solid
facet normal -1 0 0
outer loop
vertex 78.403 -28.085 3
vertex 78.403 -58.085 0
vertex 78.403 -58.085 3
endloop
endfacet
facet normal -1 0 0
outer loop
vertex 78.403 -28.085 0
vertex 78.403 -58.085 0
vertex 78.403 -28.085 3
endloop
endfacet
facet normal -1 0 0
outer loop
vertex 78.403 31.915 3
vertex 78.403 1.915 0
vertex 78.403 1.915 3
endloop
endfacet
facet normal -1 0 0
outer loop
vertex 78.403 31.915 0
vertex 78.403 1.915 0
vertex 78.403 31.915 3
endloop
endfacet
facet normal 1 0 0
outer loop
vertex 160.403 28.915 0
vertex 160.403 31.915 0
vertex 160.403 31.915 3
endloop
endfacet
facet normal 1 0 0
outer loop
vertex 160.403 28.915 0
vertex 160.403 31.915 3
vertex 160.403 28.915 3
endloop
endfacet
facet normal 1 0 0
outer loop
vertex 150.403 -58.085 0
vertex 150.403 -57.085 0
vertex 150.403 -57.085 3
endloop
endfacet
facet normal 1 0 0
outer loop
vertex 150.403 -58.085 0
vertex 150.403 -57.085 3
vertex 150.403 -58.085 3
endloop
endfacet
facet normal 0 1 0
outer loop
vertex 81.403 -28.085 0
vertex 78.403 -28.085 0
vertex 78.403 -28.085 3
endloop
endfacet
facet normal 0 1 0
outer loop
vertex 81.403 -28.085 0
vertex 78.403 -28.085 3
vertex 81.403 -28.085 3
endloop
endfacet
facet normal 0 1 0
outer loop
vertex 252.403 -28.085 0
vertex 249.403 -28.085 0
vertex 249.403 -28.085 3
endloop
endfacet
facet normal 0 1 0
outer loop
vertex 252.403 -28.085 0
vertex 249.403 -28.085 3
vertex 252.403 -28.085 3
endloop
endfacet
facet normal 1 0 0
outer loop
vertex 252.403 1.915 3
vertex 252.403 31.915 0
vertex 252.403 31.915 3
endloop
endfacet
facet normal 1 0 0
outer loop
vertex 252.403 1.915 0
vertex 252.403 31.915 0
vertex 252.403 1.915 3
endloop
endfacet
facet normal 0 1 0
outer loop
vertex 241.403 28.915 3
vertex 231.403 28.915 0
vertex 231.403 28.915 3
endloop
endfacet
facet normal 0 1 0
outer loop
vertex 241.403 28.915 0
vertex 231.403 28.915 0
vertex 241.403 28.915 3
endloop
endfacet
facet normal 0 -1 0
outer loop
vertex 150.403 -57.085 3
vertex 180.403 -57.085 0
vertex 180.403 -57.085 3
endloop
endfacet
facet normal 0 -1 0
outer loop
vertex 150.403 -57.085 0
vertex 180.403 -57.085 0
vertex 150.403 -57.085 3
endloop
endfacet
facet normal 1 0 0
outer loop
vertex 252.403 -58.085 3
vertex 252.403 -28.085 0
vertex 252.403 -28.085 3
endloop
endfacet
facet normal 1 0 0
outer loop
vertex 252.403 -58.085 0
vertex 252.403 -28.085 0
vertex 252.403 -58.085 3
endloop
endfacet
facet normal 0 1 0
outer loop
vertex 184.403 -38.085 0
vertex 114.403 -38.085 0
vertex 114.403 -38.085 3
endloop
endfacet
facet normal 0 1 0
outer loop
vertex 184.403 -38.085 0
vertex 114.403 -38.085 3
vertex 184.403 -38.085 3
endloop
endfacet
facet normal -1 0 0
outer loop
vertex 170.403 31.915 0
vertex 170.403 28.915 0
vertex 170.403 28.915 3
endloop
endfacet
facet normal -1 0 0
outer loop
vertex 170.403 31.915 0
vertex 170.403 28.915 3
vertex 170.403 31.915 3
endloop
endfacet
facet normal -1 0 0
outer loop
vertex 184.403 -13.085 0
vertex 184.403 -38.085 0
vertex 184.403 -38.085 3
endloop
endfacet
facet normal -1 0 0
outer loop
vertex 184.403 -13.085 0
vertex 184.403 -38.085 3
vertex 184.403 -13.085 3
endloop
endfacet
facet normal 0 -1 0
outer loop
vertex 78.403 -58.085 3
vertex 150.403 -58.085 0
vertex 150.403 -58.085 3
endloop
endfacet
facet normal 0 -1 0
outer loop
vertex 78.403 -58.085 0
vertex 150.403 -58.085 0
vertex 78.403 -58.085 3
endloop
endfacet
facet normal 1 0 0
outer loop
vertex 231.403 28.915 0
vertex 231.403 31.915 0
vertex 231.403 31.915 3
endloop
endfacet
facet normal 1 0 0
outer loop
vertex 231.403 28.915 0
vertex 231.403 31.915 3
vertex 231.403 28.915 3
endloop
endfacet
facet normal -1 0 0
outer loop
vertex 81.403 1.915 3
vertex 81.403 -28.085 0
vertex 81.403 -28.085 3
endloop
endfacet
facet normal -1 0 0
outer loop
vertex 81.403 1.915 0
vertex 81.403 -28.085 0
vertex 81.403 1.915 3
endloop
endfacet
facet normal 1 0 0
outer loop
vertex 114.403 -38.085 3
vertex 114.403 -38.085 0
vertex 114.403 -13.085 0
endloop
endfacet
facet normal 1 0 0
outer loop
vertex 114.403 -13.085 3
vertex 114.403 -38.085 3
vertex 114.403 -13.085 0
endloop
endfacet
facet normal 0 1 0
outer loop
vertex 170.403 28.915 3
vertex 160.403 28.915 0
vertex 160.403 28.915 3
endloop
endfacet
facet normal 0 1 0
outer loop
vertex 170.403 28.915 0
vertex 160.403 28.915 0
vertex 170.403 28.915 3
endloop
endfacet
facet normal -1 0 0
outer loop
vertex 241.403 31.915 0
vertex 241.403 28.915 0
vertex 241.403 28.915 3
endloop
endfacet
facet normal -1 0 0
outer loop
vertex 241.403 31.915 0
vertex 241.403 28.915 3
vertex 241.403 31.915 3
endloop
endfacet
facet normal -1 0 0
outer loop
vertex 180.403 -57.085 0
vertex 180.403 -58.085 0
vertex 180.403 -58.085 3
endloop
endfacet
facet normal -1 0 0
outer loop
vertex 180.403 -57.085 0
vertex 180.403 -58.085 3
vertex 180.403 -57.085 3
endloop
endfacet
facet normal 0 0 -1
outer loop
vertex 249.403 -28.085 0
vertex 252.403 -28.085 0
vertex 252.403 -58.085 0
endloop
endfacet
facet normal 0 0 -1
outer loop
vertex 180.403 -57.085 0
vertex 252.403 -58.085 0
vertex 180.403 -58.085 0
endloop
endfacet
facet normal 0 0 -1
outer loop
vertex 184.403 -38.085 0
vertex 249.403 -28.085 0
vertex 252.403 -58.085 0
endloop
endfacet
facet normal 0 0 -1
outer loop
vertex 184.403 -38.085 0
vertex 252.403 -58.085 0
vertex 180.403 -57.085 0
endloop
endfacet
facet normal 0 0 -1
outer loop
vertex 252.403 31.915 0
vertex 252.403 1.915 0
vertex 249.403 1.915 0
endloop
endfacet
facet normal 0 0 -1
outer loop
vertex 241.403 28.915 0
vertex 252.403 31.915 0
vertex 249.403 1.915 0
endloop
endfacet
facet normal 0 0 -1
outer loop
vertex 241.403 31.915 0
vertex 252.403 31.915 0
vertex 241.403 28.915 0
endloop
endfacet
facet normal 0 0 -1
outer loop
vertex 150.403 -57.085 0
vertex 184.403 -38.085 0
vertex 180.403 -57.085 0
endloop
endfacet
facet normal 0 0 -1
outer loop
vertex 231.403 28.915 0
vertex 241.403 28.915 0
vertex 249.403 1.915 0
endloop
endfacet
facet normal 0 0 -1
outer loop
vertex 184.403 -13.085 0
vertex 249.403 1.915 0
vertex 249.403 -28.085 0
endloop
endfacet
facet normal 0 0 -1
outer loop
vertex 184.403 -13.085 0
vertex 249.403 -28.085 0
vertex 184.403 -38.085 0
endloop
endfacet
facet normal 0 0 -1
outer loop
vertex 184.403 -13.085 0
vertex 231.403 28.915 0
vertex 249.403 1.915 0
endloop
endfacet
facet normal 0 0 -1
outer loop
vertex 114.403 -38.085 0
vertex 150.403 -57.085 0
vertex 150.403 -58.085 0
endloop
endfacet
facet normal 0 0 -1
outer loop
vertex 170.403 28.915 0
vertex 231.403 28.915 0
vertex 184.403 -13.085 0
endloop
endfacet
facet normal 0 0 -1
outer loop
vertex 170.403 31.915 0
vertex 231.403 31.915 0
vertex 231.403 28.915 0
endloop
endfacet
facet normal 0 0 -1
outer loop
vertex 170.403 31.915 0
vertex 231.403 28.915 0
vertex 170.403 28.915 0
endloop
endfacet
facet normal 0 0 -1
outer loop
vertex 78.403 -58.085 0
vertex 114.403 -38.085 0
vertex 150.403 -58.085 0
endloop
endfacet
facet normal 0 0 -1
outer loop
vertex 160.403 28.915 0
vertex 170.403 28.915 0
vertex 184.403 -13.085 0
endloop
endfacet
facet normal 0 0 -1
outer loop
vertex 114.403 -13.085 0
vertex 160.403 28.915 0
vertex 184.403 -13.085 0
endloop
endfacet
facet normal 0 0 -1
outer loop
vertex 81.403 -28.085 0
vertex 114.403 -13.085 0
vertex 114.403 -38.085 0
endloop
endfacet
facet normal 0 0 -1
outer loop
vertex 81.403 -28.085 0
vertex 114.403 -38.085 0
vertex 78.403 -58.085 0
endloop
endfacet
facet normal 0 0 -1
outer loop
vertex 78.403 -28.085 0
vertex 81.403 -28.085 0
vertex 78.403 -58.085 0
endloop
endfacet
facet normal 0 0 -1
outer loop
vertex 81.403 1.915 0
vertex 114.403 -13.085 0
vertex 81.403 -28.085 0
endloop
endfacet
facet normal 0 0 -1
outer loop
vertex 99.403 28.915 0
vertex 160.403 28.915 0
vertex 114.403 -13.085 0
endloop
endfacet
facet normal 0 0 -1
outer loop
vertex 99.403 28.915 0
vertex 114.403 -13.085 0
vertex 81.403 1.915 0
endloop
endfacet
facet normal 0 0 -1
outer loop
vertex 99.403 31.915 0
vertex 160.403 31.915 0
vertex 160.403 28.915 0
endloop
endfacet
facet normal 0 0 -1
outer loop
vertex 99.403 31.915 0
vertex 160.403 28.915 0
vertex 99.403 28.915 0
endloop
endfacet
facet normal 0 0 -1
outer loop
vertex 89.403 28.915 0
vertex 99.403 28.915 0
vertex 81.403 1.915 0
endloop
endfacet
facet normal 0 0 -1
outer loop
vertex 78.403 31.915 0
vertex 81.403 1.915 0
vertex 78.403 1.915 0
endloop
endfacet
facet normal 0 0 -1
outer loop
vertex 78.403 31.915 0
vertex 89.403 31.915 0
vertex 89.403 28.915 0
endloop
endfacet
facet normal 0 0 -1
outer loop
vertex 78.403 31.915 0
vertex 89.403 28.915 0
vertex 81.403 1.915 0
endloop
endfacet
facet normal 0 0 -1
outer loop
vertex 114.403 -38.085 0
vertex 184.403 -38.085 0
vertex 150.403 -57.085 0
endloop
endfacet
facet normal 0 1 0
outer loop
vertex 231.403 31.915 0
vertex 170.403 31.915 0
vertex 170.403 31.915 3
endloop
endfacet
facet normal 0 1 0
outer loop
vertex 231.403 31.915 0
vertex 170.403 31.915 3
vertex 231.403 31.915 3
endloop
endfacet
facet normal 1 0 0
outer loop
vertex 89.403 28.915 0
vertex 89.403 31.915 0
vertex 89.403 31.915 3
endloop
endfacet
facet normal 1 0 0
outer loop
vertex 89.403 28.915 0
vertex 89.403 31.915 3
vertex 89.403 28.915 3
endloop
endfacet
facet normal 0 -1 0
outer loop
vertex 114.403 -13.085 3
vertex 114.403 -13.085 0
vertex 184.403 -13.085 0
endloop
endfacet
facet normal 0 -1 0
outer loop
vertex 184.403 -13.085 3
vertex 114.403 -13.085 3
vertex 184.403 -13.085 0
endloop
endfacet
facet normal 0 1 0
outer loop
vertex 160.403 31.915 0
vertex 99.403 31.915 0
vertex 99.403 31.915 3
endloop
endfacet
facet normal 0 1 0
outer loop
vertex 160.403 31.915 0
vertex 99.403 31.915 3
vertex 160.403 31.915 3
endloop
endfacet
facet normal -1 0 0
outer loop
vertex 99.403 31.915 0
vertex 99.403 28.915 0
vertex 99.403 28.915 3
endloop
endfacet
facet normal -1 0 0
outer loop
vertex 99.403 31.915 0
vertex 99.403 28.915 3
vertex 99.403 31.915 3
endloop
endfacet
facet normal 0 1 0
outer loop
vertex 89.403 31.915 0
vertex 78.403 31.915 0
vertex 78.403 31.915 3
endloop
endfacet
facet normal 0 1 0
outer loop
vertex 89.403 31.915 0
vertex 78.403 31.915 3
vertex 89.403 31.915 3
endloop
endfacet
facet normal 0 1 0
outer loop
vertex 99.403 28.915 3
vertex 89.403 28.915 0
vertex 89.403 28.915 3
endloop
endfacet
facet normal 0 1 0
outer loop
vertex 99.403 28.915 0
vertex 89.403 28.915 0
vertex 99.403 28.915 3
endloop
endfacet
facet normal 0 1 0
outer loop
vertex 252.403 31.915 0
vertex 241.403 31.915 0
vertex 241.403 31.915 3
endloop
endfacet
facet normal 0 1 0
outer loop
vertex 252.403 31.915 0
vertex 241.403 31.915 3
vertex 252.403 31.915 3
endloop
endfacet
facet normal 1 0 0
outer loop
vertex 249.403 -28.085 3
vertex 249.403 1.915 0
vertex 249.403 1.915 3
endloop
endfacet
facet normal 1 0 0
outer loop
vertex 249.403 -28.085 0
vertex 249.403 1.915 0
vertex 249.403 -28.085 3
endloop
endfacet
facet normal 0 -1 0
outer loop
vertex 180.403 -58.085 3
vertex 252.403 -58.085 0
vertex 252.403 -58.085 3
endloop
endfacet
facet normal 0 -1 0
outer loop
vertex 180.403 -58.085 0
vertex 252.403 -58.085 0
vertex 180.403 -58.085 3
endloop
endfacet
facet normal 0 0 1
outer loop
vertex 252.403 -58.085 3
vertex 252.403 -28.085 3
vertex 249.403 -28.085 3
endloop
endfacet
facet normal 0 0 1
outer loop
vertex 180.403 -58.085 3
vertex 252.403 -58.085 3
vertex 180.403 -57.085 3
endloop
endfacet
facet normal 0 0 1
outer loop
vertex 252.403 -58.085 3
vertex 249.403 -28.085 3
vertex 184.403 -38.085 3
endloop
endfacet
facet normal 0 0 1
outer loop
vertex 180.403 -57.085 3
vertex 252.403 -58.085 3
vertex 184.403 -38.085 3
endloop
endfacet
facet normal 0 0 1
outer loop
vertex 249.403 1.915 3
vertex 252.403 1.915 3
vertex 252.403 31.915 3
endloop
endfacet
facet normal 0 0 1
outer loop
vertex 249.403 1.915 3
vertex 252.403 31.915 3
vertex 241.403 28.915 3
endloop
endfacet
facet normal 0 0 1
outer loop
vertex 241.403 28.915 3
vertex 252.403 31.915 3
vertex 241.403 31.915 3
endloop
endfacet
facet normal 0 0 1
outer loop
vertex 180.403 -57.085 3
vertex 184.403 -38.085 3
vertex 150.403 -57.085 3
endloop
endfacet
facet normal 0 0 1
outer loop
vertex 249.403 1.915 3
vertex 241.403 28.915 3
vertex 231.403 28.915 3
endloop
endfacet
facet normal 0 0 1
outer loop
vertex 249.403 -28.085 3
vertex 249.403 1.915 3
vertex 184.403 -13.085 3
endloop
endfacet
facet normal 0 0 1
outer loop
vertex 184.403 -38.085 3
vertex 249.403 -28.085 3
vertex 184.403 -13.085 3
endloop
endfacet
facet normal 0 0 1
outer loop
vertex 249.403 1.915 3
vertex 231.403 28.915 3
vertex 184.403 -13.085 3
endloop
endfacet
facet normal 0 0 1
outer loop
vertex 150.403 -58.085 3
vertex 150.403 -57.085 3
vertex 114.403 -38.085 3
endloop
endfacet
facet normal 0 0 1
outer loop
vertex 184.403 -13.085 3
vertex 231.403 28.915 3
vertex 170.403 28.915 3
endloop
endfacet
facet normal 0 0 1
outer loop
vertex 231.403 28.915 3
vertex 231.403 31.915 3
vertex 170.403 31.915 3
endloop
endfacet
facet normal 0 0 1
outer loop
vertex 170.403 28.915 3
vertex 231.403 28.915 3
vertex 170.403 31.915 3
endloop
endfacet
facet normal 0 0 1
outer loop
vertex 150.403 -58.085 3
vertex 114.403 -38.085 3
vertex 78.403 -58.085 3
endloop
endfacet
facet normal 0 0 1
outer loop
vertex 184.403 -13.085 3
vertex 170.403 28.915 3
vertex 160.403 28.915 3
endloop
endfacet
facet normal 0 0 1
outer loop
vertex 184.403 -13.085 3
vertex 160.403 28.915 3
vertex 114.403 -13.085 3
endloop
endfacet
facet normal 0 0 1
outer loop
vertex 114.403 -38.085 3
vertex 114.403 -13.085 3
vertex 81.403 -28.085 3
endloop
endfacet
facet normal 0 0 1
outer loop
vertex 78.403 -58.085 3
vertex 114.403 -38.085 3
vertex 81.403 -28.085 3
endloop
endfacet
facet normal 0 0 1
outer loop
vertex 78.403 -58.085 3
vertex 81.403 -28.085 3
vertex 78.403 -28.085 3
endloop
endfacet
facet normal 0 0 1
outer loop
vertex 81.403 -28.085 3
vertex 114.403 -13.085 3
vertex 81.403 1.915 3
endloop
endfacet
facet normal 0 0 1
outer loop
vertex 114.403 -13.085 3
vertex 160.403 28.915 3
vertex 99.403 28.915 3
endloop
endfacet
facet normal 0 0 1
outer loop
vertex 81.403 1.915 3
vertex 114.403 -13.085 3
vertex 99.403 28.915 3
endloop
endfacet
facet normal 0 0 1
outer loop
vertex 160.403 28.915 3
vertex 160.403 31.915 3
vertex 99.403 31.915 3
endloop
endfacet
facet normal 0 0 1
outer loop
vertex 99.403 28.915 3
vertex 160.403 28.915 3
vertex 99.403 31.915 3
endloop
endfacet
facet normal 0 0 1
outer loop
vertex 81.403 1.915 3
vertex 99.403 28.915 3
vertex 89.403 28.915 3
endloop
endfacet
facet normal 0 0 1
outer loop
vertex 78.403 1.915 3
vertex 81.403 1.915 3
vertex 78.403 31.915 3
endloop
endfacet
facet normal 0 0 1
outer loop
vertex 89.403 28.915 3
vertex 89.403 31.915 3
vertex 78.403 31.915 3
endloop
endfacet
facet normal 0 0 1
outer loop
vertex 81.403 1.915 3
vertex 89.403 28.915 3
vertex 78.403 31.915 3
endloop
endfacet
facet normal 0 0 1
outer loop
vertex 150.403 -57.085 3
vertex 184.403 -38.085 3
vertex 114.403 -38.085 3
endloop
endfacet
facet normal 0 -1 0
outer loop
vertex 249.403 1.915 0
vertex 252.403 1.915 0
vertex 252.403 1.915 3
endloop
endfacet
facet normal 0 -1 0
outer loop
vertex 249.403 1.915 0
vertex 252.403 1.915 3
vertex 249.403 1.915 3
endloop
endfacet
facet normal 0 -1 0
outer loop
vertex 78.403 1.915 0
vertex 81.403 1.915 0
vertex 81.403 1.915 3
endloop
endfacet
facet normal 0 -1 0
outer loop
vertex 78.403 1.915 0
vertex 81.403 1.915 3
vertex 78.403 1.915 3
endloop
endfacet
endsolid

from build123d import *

# Parameters (mm, degrees)
MODEL_W             = 70
MODEL_H             = 25
BOSS_EXTRUDE1_DEPTH = 3


with BuildPart() as part:
    # Model → Boss-Extrude1 (new body)
    with BuildSketch(Plane.XY):
        Polygon((249.402887008, 1.915275896), (249.402887008, -28.084724104), (252.402887008, -28.084724104), (252.402887008, -58.084724104), (180.402887008, -58.084724104), (180.402887008, -57.084724104), (150.402887008, -57.084724104), (150.402887008, -58.084724104), (78.402887008, -58.084724104), (78.402887008, -28.084724104), (81.402887008, -28.084724104), (81.402887008, 1.915275896), (78.402887008, 1.915275896), (78.402887008, 31.915275896), (89.402887008, 31.915275896), (89.402887008, 28.915275896), (99.402887008, 28.915275896), (99.402887008, 31.915275896), (160.402887008, 31.915275896), (160.402887008, 28.915275896), (170.402887008, 28.915275896), (170.402887008, 31.915275896), (231.402887008, 31.915275896), (231.402887008, 28.915275896), (241.402887008, 28.915275896), (241.402887008, 31.915275896), (252.402887008, 31.915275896), (252.402887008, 1.915275896), align=None)
        with Locations((149.402887008, -25.584724104)):
            Rectangle(MODEL_W, MODEL_H, mode=Mode.SUBTRACT)
    extrude(amount=BOSS_EXTRUDE1_DEPTH)


solid = part.part
